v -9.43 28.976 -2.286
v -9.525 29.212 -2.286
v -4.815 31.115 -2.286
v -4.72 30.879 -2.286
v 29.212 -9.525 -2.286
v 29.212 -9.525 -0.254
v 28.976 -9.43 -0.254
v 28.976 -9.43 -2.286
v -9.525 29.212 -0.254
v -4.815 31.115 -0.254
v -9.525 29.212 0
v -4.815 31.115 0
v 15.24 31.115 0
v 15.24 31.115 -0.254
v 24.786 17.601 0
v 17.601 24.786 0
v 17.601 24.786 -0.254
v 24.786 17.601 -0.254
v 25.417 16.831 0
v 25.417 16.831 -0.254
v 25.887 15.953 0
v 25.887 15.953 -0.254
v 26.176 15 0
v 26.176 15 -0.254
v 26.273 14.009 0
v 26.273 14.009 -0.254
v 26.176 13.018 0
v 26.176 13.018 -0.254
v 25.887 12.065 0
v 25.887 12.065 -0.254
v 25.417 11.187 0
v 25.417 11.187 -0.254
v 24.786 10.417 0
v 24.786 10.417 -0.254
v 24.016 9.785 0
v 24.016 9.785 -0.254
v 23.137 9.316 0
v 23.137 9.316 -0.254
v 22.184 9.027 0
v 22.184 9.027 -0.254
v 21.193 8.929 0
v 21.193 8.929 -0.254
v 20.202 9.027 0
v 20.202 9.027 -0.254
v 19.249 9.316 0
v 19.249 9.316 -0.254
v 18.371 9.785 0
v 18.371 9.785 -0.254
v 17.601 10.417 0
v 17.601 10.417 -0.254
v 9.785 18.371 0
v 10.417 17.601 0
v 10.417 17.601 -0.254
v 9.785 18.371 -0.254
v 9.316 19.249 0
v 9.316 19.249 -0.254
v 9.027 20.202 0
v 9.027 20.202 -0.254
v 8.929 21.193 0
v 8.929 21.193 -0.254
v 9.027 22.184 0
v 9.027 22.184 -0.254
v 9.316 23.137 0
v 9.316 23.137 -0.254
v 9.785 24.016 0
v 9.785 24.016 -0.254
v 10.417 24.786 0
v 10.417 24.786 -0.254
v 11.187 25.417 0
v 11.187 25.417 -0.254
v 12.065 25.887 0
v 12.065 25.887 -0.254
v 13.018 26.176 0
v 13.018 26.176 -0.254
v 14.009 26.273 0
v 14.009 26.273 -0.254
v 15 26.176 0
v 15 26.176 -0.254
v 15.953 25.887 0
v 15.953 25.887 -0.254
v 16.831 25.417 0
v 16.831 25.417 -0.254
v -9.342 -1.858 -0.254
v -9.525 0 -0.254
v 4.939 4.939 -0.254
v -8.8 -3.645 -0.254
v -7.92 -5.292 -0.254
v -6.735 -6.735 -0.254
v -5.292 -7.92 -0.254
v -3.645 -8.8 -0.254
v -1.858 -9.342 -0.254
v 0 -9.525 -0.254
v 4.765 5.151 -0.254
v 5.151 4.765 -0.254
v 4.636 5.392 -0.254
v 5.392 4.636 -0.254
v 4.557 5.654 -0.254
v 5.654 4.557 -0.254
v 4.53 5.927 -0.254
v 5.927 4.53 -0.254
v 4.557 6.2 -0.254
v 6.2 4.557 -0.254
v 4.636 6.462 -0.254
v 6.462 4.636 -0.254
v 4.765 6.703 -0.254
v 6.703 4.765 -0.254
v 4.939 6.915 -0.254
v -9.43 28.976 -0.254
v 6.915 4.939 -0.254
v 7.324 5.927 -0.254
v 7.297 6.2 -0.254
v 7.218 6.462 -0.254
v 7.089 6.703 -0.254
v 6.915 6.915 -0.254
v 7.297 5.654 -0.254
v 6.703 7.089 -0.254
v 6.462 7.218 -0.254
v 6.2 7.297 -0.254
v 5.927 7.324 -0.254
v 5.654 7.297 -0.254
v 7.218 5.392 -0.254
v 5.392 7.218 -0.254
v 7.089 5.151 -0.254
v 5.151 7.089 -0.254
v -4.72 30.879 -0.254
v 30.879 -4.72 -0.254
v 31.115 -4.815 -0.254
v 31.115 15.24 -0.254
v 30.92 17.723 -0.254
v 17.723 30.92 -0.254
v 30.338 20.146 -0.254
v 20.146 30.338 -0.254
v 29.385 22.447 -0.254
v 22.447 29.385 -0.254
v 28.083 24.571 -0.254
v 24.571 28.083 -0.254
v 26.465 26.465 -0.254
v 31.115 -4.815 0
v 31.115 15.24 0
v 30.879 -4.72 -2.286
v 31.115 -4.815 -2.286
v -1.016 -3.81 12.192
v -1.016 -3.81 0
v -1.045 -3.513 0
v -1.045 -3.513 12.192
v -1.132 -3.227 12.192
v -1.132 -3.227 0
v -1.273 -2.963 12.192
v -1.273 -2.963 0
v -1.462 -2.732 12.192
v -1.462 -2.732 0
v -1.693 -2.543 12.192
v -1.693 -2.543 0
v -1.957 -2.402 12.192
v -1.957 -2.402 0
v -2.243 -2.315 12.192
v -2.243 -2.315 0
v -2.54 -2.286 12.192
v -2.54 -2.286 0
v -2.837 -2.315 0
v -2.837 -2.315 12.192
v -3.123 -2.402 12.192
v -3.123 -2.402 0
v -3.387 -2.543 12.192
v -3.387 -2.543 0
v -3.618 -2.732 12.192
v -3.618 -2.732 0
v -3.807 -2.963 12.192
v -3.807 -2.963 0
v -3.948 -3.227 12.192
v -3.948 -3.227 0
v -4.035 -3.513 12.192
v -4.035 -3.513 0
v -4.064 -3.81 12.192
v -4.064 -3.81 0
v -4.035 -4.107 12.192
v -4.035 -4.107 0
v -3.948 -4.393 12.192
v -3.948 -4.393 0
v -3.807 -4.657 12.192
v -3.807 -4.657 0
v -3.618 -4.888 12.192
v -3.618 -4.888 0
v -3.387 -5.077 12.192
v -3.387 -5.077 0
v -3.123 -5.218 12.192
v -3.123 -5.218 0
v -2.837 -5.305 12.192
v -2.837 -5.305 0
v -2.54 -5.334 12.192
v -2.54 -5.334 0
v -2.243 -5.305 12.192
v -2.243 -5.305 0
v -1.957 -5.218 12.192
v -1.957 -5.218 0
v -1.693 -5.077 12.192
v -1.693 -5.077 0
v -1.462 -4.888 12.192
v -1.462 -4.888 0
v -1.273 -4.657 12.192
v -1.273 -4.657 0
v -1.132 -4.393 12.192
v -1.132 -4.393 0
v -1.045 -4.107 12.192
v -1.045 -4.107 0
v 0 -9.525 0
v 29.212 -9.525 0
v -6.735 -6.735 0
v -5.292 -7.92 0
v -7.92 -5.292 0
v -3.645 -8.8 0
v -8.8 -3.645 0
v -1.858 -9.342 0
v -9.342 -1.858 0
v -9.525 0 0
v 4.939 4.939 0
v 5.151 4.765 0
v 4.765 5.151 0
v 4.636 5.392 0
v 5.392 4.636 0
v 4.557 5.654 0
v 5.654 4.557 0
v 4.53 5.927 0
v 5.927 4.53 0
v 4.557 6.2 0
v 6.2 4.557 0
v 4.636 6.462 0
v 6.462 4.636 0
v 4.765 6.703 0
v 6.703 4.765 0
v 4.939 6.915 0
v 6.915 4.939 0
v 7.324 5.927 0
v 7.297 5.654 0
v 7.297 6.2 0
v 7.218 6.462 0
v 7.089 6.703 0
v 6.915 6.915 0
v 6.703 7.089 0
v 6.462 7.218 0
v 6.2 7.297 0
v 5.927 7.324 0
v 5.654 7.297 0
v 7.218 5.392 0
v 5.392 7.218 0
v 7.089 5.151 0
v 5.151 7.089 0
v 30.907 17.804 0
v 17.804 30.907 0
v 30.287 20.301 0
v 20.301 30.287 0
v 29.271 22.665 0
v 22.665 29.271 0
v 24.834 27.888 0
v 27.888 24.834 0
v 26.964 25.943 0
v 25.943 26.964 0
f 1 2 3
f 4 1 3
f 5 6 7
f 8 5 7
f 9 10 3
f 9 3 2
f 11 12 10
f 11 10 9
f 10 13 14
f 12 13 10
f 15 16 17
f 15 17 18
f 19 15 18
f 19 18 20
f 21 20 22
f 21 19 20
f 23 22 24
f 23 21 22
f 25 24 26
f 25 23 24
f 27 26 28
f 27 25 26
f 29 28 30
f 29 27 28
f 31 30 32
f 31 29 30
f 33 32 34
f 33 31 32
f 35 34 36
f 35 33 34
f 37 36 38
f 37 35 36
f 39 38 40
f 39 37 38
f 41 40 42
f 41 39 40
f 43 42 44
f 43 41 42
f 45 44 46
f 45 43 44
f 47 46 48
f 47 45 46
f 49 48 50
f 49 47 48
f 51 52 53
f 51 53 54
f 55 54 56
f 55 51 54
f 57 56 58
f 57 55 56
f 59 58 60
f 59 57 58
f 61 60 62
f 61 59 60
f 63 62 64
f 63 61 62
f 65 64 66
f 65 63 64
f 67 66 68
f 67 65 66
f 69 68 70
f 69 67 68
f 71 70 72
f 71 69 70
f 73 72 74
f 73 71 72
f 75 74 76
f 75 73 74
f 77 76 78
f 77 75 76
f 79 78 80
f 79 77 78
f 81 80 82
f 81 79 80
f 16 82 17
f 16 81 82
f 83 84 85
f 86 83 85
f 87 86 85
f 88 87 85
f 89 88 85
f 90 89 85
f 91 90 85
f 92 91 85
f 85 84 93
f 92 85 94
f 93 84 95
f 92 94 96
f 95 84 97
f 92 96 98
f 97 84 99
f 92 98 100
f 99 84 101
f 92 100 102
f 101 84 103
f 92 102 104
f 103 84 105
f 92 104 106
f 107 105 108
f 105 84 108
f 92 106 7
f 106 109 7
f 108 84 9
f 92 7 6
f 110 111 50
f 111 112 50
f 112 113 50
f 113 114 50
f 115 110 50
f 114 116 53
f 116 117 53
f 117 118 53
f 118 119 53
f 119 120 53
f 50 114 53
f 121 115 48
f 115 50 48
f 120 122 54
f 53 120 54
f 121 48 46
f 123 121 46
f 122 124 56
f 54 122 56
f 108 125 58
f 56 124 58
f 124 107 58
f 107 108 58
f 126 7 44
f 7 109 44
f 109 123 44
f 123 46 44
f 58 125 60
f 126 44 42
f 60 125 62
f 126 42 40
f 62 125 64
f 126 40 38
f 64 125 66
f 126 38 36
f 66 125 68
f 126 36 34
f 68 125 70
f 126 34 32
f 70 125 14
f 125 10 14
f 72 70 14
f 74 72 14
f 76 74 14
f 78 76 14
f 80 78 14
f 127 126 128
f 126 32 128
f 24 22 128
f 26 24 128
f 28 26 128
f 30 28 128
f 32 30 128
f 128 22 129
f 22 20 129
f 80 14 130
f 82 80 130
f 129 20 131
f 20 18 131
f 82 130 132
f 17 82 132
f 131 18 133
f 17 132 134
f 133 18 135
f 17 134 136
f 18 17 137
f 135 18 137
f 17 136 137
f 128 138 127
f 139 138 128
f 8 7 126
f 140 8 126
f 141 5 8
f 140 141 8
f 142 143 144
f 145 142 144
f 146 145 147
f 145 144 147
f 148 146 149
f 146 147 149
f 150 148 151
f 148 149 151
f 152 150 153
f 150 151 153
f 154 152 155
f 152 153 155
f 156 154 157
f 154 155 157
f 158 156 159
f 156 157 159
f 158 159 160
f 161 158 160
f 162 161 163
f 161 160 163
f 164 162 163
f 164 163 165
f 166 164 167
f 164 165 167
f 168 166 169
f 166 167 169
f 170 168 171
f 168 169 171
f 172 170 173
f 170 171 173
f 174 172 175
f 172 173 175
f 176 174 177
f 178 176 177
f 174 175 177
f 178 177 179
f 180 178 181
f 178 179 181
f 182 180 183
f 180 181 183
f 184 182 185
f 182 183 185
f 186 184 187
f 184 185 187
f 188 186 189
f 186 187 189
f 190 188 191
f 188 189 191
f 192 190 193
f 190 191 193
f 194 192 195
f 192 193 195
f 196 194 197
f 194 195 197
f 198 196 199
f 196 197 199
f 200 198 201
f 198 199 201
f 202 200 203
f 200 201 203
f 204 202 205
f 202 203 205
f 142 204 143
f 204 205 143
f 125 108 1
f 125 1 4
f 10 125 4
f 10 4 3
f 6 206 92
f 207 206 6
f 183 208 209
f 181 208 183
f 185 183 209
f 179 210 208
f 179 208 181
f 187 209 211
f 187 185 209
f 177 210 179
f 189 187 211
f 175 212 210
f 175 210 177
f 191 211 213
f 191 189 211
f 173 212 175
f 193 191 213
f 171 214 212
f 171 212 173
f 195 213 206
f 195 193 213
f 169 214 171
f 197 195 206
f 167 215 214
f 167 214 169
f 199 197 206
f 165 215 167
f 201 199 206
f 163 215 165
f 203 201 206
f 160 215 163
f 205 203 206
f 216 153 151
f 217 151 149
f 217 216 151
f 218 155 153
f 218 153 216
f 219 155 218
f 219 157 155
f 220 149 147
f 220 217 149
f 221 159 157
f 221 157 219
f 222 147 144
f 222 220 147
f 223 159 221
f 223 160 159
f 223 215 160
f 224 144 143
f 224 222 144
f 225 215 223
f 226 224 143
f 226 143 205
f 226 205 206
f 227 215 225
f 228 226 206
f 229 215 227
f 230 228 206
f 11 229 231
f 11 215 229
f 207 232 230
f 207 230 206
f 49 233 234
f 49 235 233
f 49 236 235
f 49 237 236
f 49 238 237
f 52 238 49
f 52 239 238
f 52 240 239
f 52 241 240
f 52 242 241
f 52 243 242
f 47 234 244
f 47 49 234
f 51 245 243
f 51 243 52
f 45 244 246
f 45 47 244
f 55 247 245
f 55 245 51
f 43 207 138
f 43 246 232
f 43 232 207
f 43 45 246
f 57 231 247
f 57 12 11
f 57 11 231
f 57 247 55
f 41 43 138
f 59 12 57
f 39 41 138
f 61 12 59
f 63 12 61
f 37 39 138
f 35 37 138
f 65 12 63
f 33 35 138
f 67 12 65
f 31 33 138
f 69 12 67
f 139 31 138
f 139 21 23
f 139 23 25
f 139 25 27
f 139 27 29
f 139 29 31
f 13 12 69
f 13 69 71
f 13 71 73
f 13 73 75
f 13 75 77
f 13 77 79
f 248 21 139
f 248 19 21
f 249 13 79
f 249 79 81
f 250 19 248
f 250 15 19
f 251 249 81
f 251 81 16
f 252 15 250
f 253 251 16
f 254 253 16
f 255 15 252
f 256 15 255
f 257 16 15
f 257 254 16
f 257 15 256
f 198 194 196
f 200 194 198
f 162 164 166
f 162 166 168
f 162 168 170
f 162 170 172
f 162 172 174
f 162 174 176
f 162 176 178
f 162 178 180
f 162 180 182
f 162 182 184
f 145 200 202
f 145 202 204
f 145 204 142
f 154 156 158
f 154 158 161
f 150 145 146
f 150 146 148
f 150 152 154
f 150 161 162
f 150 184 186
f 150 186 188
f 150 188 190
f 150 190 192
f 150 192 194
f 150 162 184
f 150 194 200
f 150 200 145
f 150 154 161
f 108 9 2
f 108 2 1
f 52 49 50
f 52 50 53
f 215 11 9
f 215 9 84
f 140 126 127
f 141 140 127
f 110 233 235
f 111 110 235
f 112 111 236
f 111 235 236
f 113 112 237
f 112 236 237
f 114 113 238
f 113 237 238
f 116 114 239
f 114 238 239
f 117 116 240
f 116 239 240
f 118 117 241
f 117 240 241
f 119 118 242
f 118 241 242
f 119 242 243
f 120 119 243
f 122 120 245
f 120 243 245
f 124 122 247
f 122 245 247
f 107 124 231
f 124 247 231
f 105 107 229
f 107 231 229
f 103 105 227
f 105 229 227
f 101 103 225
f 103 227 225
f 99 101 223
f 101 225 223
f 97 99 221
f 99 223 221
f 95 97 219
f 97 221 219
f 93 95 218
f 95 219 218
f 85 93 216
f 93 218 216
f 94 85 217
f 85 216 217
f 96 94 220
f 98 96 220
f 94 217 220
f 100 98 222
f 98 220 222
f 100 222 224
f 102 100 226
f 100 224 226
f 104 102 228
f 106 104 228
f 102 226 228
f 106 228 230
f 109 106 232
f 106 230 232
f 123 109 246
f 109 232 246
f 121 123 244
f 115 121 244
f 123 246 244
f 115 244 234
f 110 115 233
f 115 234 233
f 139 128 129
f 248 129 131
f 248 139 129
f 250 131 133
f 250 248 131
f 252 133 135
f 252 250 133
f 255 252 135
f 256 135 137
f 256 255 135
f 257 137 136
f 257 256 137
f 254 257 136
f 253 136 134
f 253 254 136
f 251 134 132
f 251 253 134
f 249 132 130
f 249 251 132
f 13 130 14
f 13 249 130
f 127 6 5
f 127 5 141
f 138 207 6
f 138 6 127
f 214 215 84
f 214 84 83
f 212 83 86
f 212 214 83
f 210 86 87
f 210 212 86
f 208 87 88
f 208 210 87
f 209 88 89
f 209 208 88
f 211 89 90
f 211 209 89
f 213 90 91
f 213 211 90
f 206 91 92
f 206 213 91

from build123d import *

# Parameters (mm, degrees)
BOSS_EXTRUDE1_DEPTH = 0.254
SKETCH2_R           = 2.032
CUT_EXTRUDE1_DEPTH  = 0.254
SKETCH3_R           = 1.397
CUT_EXTRUDE2_DEPTH  = 0.254
CUT_EXTRUDE3_DEPTH  = 0.254
SKETCH5_R           = 1.524
BOSS_EXTRUDE2_DEPTH = 12.192
BOSS_EXTRUDE3_DEPTH = 2.286
SKETCH8_R           = 2.05178126
BOSS_EXTRUDE4_DEPTH = 0.254
SKETCH9_W           = 2.585879879
SKETCH9_H           = 0.671823721
CUT_EXTRUDE4_DEPTH  = 31.895819587


with BuildPart() as part:
    # Sketch1 → Boss-Extrude1 (new body)
    with BuildSketch(Plane.XY):
        with BuildLine():
            Line((0, -9.525), (29.211998505, -9.525))
            Line((29.211998505, -9.525), (31.115, -4.814906019))
            Line((31.115, -4.814906019), (31.115, 15.24))
            ThreePointArc((31.115, 15.24), (26.465320151, 26.465320151), (15.24, 31.115))
            Line((15.24, 31.115), (-4.814906019, 31.115))
            Line((-4.814906019, 31.115), (-9.525, 29.211998505))
            Line((-9.525, 29.211998505), (-9.525, 0))
            ThreePointArc((-9.525, 0), (-6.735192091, -6.735192091), (0, -9.525))
        make_face()
    extrude(amount=-BOSS_EXTRUDE1_DEPTH)

    # Sketch2 → Cut-Extrude1 (cut)
    with BuildSketch(Plane.XY):
        Circle(SKETCH2_R)
    extrude(amount=-CUT_EXTRUDE1_DEPTH, mode=Mode.SUBTRACT)

    # Sketch3 → Cut-Extrude2 (cut)
    with BuildSketch(Plane.XY):
        with Locations((5.92696904, 5.92696904)):
            Circle(SKETCH3_R)
    extrude(amount=-CUT_EXTRUDE2_DEPTH, mode=Mode.SUBTRACT)

    # Sketch4 → Cut-Extrude3 (cut)
    with BuildSketch(Plane.XY):
        with BuildLine():
            Line((17.601301997, 24.785506894), (24.785506894, 17.601301997))
            ThreePointArc((24.785506894, 17.601301997), (24.785506894, 10.4170971), (17.601301997, 10.4170971))
            Line((17.601301997, 10.4170971), (10.4170971, 17.601301997))
            ThreePointArc((10.4170971, 17.601301997), (10.4170971, 24.785506894), (17.601301997, 24.785506894))
        make_face()
    extrude(amount=-CUT_EXTRUDE3_DEPTH, mode=Mode.SUBTRACT)

    # Sketch5 → Boss-Extrude2 (add)
    with BuildSketch(Plane.XY):
        with Locations((-2.54, -3.81)):
            Circle(SKETCH5_R)
    extrude(amount=BOSS_EXTRUDE2_DEPTH)

    # Sketch7 → Boss-Extrude3 (add)
    with BuildSketch(Plane.XY):
        Polygon((29.211998505, -9.525), (28.976493806, -9.429849925), (30.879495301, -4.719755944), (31.115, -4.814906019), align=None)
        with BuildLine():
            Line((27.708062292, 24.654775211), (27.887667414, 24.834380333))
            ThreePointArc((27.887667414, 24.834380333), (26.465320151, 26.465320151), (24.834380333, 27.887667414))
            Line((24.834380333, 27.887667414), (24.654775211, 27.708062292))
            Line((24.654775211, 27.708062292), (27.708062292, 24.654775211))
        make_face()
        Polygon((-9.525, 29.211998505), (-9.429849925, 28.976493806), (-4.719755944, 30.879495301), (-4.814906019, 31.115), align=None)
    extrude(amount=-BOSS_EXTRUDE3_DEPTH)

    # Sketch8 → Boss-Extrude4 (add)
    with BuildSketch(Plane.XY):
        Circle(SKETCH8_R)
    extrude(amount=-BOSS_EXTRUDE4_DEPTH)

    # Sketch9 → Cut-Extrude4 (cut, through all)
    with BuildSketch(Plane(origin=(-1.526643541, 1.526643541, 0), x_dir=(0, 0, 1), z_dir=(-0.707106781, 0.707106781, 0))):
        with Locations((-1.54693994, 37.362029341)):
            Rectangle(SKETCH9_W, SKETCH9_H)
    extrude(amount=-CUT_EXTRUDE4_DEPTH, mode=Mode.SUBTRACT)


solid = part.part
